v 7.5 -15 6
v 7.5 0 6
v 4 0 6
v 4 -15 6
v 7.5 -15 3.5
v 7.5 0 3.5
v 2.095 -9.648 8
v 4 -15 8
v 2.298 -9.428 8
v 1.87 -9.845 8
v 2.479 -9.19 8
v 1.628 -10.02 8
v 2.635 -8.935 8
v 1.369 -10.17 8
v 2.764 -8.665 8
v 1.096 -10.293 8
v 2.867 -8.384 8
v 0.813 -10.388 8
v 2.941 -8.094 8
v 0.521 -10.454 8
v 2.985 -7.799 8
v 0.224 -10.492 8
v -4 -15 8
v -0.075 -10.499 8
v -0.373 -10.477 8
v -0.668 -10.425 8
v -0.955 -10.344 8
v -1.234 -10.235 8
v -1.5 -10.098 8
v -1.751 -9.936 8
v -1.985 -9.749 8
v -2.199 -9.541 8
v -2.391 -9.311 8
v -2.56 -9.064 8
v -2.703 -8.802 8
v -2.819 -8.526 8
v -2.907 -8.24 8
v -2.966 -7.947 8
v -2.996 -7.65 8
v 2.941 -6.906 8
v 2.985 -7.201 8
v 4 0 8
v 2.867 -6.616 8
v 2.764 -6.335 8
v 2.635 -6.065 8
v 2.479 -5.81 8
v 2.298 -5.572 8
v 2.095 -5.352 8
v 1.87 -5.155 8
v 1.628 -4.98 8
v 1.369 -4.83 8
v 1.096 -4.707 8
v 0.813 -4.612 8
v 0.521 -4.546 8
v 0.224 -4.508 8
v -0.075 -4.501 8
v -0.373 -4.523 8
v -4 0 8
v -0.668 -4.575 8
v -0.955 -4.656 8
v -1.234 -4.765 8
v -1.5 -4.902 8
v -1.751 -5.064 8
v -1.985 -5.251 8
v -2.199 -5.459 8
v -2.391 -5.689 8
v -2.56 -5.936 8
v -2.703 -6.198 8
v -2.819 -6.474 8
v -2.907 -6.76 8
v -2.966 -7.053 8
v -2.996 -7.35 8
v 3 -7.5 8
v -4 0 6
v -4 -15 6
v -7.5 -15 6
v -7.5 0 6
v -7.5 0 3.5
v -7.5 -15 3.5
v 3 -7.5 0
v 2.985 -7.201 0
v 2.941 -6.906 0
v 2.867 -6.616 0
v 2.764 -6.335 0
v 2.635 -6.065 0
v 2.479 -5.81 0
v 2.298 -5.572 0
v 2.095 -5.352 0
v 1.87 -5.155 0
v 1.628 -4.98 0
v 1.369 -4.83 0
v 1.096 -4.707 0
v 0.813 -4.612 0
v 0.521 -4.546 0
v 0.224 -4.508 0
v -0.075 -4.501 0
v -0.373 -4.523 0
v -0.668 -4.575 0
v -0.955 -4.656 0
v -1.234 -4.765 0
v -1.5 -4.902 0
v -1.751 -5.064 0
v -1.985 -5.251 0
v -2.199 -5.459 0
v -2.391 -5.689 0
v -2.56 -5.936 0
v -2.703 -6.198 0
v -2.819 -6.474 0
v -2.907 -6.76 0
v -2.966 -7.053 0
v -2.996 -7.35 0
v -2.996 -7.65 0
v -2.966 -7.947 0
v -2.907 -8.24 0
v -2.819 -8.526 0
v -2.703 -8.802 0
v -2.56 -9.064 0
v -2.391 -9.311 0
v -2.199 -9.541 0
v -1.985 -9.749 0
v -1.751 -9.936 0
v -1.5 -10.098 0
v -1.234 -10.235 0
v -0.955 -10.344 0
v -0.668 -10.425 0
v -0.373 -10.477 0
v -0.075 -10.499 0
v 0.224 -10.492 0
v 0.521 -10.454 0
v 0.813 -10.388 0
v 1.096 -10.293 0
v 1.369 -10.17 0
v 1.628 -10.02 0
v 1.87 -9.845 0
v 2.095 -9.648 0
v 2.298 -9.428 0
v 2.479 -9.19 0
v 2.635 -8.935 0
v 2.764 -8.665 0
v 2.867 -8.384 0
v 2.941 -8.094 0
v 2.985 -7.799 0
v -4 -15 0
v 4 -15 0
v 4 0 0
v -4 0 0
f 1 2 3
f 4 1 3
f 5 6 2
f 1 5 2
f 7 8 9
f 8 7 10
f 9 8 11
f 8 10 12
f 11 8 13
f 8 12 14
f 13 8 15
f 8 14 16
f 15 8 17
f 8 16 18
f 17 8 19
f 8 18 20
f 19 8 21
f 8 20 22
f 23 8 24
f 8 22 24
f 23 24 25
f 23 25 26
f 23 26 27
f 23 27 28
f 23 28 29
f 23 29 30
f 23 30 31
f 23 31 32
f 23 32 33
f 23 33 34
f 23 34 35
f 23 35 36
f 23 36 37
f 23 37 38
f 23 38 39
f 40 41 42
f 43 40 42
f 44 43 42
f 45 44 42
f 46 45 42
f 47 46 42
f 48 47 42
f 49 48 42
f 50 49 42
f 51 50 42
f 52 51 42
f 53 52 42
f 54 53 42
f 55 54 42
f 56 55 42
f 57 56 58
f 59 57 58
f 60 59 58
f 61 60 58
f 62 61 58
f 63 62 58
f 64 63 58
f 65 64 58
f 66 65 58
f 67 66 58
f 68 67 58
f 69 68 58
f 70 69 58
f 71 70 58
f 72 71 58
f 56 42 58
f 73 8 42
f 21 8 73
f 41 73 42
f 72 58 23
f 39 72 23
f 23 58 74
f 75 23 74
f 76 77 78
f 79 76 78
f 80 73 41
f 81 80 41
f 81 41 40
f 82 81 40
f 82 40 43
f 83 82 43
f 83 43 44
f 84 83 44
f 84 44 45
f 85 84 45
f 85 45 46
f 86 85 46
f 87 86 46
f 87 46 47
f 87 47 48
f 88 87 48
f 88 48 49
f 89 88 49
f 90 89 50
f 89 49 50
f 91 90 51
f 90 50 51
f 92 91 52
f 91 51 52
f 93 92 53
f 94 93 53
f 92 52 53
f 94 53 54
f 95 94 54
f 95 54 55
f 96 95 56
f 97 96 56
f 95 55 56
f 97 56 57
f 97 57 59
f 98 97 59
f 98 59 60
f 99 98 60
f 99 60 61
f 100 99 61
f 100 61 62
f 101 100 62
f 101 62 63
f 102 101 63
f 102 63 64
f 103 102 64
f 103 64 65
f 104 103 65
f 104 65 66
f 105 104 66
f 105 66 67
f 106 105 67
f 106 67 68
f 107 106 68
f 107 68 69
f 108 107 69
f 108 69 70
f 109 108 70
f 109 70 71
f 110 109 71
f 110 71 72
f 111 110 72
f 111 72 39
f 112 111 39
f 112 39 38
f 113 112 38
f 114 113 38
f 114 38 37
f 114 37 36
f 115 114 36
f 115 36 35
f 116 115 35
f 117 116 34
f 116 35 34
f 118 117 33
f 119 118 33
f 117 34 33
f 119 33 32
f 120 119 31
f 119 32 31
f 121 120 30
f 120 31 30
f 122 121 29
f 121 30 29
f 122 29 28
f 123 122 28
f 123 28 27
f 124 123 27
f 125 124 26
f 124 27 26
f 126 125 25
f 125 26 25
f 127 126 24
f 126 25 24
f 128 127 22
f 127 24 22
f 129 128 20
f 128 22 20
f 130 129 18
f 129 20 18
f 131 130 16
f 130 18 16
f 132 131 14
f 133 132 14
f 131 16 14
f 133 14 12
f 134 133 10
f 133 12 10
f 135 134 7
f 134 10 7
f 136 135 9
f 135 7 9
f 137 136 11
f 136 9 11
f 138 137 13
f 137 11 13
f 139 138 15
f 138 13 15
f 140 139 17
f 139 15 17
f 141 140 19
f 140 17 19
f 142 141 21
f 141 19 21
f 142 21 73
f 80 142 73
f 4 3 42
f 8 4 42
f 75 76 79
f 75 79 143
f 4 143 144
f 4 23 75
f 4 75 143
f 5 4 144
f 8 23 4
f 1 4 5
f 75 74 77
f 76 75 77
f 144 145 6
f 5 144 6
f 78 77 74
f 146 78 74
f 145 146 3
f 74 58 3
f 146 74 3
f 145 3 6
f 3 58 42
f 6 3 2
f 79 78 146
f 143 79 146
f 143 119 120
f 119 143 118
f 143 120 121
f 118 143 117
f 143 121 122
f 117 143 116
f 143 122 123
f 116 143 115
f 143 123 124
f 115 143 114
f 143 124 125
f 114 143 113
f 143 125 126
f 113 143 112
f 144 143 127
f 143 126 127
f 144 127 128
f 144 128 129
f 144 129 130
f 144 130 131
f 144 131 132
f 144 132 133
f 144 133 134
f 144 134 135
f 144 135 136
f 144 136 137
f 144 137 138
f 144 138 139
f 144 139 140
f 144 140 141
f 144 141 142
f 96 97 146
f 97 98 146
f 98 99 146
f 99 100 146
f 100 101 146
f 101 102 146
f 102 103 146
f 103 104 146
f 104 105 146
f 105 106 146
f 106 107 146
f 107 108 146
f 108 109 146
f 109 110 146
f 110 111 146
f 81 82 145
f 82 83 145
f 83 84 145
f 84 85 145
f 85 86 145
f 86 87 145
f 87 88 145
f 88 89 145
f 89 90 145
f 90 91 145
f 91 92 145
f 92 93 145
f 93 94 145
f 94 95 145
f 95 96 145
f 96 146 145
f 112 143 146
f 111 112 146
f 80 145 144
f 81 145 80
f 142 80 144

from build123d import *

# Parameters (mm, degrees)
F1_DEPTH = 15
F2_R     = 3
F3_DEPTH = 8.001


with BuildPart() as f1:
    # F0 (on Front) → F1 (new body)
    with BuildSketch(Plane.XZ):
        Polygon((-4, 0), (0, 0), (4, 0), (7.5, 3.5), (7.5, 6), (4, 6), (4, 8), (0, 8), (-4, 8), (-4, 6), (-7.5, 6), (-7.5, 3.5), align=None)
    extrude(amount=F1_DEPTH)

    # F2 (on face) → F3 (cut, through all)
    with BuildSketch(Plane.XY.offset(8)):
        with Locations((0, -7.5)):
            Circle(F2_R)
    extrude(amount=-F3_DEPTH, mode=Mode.SUBTRACT)


solid = f1.part
